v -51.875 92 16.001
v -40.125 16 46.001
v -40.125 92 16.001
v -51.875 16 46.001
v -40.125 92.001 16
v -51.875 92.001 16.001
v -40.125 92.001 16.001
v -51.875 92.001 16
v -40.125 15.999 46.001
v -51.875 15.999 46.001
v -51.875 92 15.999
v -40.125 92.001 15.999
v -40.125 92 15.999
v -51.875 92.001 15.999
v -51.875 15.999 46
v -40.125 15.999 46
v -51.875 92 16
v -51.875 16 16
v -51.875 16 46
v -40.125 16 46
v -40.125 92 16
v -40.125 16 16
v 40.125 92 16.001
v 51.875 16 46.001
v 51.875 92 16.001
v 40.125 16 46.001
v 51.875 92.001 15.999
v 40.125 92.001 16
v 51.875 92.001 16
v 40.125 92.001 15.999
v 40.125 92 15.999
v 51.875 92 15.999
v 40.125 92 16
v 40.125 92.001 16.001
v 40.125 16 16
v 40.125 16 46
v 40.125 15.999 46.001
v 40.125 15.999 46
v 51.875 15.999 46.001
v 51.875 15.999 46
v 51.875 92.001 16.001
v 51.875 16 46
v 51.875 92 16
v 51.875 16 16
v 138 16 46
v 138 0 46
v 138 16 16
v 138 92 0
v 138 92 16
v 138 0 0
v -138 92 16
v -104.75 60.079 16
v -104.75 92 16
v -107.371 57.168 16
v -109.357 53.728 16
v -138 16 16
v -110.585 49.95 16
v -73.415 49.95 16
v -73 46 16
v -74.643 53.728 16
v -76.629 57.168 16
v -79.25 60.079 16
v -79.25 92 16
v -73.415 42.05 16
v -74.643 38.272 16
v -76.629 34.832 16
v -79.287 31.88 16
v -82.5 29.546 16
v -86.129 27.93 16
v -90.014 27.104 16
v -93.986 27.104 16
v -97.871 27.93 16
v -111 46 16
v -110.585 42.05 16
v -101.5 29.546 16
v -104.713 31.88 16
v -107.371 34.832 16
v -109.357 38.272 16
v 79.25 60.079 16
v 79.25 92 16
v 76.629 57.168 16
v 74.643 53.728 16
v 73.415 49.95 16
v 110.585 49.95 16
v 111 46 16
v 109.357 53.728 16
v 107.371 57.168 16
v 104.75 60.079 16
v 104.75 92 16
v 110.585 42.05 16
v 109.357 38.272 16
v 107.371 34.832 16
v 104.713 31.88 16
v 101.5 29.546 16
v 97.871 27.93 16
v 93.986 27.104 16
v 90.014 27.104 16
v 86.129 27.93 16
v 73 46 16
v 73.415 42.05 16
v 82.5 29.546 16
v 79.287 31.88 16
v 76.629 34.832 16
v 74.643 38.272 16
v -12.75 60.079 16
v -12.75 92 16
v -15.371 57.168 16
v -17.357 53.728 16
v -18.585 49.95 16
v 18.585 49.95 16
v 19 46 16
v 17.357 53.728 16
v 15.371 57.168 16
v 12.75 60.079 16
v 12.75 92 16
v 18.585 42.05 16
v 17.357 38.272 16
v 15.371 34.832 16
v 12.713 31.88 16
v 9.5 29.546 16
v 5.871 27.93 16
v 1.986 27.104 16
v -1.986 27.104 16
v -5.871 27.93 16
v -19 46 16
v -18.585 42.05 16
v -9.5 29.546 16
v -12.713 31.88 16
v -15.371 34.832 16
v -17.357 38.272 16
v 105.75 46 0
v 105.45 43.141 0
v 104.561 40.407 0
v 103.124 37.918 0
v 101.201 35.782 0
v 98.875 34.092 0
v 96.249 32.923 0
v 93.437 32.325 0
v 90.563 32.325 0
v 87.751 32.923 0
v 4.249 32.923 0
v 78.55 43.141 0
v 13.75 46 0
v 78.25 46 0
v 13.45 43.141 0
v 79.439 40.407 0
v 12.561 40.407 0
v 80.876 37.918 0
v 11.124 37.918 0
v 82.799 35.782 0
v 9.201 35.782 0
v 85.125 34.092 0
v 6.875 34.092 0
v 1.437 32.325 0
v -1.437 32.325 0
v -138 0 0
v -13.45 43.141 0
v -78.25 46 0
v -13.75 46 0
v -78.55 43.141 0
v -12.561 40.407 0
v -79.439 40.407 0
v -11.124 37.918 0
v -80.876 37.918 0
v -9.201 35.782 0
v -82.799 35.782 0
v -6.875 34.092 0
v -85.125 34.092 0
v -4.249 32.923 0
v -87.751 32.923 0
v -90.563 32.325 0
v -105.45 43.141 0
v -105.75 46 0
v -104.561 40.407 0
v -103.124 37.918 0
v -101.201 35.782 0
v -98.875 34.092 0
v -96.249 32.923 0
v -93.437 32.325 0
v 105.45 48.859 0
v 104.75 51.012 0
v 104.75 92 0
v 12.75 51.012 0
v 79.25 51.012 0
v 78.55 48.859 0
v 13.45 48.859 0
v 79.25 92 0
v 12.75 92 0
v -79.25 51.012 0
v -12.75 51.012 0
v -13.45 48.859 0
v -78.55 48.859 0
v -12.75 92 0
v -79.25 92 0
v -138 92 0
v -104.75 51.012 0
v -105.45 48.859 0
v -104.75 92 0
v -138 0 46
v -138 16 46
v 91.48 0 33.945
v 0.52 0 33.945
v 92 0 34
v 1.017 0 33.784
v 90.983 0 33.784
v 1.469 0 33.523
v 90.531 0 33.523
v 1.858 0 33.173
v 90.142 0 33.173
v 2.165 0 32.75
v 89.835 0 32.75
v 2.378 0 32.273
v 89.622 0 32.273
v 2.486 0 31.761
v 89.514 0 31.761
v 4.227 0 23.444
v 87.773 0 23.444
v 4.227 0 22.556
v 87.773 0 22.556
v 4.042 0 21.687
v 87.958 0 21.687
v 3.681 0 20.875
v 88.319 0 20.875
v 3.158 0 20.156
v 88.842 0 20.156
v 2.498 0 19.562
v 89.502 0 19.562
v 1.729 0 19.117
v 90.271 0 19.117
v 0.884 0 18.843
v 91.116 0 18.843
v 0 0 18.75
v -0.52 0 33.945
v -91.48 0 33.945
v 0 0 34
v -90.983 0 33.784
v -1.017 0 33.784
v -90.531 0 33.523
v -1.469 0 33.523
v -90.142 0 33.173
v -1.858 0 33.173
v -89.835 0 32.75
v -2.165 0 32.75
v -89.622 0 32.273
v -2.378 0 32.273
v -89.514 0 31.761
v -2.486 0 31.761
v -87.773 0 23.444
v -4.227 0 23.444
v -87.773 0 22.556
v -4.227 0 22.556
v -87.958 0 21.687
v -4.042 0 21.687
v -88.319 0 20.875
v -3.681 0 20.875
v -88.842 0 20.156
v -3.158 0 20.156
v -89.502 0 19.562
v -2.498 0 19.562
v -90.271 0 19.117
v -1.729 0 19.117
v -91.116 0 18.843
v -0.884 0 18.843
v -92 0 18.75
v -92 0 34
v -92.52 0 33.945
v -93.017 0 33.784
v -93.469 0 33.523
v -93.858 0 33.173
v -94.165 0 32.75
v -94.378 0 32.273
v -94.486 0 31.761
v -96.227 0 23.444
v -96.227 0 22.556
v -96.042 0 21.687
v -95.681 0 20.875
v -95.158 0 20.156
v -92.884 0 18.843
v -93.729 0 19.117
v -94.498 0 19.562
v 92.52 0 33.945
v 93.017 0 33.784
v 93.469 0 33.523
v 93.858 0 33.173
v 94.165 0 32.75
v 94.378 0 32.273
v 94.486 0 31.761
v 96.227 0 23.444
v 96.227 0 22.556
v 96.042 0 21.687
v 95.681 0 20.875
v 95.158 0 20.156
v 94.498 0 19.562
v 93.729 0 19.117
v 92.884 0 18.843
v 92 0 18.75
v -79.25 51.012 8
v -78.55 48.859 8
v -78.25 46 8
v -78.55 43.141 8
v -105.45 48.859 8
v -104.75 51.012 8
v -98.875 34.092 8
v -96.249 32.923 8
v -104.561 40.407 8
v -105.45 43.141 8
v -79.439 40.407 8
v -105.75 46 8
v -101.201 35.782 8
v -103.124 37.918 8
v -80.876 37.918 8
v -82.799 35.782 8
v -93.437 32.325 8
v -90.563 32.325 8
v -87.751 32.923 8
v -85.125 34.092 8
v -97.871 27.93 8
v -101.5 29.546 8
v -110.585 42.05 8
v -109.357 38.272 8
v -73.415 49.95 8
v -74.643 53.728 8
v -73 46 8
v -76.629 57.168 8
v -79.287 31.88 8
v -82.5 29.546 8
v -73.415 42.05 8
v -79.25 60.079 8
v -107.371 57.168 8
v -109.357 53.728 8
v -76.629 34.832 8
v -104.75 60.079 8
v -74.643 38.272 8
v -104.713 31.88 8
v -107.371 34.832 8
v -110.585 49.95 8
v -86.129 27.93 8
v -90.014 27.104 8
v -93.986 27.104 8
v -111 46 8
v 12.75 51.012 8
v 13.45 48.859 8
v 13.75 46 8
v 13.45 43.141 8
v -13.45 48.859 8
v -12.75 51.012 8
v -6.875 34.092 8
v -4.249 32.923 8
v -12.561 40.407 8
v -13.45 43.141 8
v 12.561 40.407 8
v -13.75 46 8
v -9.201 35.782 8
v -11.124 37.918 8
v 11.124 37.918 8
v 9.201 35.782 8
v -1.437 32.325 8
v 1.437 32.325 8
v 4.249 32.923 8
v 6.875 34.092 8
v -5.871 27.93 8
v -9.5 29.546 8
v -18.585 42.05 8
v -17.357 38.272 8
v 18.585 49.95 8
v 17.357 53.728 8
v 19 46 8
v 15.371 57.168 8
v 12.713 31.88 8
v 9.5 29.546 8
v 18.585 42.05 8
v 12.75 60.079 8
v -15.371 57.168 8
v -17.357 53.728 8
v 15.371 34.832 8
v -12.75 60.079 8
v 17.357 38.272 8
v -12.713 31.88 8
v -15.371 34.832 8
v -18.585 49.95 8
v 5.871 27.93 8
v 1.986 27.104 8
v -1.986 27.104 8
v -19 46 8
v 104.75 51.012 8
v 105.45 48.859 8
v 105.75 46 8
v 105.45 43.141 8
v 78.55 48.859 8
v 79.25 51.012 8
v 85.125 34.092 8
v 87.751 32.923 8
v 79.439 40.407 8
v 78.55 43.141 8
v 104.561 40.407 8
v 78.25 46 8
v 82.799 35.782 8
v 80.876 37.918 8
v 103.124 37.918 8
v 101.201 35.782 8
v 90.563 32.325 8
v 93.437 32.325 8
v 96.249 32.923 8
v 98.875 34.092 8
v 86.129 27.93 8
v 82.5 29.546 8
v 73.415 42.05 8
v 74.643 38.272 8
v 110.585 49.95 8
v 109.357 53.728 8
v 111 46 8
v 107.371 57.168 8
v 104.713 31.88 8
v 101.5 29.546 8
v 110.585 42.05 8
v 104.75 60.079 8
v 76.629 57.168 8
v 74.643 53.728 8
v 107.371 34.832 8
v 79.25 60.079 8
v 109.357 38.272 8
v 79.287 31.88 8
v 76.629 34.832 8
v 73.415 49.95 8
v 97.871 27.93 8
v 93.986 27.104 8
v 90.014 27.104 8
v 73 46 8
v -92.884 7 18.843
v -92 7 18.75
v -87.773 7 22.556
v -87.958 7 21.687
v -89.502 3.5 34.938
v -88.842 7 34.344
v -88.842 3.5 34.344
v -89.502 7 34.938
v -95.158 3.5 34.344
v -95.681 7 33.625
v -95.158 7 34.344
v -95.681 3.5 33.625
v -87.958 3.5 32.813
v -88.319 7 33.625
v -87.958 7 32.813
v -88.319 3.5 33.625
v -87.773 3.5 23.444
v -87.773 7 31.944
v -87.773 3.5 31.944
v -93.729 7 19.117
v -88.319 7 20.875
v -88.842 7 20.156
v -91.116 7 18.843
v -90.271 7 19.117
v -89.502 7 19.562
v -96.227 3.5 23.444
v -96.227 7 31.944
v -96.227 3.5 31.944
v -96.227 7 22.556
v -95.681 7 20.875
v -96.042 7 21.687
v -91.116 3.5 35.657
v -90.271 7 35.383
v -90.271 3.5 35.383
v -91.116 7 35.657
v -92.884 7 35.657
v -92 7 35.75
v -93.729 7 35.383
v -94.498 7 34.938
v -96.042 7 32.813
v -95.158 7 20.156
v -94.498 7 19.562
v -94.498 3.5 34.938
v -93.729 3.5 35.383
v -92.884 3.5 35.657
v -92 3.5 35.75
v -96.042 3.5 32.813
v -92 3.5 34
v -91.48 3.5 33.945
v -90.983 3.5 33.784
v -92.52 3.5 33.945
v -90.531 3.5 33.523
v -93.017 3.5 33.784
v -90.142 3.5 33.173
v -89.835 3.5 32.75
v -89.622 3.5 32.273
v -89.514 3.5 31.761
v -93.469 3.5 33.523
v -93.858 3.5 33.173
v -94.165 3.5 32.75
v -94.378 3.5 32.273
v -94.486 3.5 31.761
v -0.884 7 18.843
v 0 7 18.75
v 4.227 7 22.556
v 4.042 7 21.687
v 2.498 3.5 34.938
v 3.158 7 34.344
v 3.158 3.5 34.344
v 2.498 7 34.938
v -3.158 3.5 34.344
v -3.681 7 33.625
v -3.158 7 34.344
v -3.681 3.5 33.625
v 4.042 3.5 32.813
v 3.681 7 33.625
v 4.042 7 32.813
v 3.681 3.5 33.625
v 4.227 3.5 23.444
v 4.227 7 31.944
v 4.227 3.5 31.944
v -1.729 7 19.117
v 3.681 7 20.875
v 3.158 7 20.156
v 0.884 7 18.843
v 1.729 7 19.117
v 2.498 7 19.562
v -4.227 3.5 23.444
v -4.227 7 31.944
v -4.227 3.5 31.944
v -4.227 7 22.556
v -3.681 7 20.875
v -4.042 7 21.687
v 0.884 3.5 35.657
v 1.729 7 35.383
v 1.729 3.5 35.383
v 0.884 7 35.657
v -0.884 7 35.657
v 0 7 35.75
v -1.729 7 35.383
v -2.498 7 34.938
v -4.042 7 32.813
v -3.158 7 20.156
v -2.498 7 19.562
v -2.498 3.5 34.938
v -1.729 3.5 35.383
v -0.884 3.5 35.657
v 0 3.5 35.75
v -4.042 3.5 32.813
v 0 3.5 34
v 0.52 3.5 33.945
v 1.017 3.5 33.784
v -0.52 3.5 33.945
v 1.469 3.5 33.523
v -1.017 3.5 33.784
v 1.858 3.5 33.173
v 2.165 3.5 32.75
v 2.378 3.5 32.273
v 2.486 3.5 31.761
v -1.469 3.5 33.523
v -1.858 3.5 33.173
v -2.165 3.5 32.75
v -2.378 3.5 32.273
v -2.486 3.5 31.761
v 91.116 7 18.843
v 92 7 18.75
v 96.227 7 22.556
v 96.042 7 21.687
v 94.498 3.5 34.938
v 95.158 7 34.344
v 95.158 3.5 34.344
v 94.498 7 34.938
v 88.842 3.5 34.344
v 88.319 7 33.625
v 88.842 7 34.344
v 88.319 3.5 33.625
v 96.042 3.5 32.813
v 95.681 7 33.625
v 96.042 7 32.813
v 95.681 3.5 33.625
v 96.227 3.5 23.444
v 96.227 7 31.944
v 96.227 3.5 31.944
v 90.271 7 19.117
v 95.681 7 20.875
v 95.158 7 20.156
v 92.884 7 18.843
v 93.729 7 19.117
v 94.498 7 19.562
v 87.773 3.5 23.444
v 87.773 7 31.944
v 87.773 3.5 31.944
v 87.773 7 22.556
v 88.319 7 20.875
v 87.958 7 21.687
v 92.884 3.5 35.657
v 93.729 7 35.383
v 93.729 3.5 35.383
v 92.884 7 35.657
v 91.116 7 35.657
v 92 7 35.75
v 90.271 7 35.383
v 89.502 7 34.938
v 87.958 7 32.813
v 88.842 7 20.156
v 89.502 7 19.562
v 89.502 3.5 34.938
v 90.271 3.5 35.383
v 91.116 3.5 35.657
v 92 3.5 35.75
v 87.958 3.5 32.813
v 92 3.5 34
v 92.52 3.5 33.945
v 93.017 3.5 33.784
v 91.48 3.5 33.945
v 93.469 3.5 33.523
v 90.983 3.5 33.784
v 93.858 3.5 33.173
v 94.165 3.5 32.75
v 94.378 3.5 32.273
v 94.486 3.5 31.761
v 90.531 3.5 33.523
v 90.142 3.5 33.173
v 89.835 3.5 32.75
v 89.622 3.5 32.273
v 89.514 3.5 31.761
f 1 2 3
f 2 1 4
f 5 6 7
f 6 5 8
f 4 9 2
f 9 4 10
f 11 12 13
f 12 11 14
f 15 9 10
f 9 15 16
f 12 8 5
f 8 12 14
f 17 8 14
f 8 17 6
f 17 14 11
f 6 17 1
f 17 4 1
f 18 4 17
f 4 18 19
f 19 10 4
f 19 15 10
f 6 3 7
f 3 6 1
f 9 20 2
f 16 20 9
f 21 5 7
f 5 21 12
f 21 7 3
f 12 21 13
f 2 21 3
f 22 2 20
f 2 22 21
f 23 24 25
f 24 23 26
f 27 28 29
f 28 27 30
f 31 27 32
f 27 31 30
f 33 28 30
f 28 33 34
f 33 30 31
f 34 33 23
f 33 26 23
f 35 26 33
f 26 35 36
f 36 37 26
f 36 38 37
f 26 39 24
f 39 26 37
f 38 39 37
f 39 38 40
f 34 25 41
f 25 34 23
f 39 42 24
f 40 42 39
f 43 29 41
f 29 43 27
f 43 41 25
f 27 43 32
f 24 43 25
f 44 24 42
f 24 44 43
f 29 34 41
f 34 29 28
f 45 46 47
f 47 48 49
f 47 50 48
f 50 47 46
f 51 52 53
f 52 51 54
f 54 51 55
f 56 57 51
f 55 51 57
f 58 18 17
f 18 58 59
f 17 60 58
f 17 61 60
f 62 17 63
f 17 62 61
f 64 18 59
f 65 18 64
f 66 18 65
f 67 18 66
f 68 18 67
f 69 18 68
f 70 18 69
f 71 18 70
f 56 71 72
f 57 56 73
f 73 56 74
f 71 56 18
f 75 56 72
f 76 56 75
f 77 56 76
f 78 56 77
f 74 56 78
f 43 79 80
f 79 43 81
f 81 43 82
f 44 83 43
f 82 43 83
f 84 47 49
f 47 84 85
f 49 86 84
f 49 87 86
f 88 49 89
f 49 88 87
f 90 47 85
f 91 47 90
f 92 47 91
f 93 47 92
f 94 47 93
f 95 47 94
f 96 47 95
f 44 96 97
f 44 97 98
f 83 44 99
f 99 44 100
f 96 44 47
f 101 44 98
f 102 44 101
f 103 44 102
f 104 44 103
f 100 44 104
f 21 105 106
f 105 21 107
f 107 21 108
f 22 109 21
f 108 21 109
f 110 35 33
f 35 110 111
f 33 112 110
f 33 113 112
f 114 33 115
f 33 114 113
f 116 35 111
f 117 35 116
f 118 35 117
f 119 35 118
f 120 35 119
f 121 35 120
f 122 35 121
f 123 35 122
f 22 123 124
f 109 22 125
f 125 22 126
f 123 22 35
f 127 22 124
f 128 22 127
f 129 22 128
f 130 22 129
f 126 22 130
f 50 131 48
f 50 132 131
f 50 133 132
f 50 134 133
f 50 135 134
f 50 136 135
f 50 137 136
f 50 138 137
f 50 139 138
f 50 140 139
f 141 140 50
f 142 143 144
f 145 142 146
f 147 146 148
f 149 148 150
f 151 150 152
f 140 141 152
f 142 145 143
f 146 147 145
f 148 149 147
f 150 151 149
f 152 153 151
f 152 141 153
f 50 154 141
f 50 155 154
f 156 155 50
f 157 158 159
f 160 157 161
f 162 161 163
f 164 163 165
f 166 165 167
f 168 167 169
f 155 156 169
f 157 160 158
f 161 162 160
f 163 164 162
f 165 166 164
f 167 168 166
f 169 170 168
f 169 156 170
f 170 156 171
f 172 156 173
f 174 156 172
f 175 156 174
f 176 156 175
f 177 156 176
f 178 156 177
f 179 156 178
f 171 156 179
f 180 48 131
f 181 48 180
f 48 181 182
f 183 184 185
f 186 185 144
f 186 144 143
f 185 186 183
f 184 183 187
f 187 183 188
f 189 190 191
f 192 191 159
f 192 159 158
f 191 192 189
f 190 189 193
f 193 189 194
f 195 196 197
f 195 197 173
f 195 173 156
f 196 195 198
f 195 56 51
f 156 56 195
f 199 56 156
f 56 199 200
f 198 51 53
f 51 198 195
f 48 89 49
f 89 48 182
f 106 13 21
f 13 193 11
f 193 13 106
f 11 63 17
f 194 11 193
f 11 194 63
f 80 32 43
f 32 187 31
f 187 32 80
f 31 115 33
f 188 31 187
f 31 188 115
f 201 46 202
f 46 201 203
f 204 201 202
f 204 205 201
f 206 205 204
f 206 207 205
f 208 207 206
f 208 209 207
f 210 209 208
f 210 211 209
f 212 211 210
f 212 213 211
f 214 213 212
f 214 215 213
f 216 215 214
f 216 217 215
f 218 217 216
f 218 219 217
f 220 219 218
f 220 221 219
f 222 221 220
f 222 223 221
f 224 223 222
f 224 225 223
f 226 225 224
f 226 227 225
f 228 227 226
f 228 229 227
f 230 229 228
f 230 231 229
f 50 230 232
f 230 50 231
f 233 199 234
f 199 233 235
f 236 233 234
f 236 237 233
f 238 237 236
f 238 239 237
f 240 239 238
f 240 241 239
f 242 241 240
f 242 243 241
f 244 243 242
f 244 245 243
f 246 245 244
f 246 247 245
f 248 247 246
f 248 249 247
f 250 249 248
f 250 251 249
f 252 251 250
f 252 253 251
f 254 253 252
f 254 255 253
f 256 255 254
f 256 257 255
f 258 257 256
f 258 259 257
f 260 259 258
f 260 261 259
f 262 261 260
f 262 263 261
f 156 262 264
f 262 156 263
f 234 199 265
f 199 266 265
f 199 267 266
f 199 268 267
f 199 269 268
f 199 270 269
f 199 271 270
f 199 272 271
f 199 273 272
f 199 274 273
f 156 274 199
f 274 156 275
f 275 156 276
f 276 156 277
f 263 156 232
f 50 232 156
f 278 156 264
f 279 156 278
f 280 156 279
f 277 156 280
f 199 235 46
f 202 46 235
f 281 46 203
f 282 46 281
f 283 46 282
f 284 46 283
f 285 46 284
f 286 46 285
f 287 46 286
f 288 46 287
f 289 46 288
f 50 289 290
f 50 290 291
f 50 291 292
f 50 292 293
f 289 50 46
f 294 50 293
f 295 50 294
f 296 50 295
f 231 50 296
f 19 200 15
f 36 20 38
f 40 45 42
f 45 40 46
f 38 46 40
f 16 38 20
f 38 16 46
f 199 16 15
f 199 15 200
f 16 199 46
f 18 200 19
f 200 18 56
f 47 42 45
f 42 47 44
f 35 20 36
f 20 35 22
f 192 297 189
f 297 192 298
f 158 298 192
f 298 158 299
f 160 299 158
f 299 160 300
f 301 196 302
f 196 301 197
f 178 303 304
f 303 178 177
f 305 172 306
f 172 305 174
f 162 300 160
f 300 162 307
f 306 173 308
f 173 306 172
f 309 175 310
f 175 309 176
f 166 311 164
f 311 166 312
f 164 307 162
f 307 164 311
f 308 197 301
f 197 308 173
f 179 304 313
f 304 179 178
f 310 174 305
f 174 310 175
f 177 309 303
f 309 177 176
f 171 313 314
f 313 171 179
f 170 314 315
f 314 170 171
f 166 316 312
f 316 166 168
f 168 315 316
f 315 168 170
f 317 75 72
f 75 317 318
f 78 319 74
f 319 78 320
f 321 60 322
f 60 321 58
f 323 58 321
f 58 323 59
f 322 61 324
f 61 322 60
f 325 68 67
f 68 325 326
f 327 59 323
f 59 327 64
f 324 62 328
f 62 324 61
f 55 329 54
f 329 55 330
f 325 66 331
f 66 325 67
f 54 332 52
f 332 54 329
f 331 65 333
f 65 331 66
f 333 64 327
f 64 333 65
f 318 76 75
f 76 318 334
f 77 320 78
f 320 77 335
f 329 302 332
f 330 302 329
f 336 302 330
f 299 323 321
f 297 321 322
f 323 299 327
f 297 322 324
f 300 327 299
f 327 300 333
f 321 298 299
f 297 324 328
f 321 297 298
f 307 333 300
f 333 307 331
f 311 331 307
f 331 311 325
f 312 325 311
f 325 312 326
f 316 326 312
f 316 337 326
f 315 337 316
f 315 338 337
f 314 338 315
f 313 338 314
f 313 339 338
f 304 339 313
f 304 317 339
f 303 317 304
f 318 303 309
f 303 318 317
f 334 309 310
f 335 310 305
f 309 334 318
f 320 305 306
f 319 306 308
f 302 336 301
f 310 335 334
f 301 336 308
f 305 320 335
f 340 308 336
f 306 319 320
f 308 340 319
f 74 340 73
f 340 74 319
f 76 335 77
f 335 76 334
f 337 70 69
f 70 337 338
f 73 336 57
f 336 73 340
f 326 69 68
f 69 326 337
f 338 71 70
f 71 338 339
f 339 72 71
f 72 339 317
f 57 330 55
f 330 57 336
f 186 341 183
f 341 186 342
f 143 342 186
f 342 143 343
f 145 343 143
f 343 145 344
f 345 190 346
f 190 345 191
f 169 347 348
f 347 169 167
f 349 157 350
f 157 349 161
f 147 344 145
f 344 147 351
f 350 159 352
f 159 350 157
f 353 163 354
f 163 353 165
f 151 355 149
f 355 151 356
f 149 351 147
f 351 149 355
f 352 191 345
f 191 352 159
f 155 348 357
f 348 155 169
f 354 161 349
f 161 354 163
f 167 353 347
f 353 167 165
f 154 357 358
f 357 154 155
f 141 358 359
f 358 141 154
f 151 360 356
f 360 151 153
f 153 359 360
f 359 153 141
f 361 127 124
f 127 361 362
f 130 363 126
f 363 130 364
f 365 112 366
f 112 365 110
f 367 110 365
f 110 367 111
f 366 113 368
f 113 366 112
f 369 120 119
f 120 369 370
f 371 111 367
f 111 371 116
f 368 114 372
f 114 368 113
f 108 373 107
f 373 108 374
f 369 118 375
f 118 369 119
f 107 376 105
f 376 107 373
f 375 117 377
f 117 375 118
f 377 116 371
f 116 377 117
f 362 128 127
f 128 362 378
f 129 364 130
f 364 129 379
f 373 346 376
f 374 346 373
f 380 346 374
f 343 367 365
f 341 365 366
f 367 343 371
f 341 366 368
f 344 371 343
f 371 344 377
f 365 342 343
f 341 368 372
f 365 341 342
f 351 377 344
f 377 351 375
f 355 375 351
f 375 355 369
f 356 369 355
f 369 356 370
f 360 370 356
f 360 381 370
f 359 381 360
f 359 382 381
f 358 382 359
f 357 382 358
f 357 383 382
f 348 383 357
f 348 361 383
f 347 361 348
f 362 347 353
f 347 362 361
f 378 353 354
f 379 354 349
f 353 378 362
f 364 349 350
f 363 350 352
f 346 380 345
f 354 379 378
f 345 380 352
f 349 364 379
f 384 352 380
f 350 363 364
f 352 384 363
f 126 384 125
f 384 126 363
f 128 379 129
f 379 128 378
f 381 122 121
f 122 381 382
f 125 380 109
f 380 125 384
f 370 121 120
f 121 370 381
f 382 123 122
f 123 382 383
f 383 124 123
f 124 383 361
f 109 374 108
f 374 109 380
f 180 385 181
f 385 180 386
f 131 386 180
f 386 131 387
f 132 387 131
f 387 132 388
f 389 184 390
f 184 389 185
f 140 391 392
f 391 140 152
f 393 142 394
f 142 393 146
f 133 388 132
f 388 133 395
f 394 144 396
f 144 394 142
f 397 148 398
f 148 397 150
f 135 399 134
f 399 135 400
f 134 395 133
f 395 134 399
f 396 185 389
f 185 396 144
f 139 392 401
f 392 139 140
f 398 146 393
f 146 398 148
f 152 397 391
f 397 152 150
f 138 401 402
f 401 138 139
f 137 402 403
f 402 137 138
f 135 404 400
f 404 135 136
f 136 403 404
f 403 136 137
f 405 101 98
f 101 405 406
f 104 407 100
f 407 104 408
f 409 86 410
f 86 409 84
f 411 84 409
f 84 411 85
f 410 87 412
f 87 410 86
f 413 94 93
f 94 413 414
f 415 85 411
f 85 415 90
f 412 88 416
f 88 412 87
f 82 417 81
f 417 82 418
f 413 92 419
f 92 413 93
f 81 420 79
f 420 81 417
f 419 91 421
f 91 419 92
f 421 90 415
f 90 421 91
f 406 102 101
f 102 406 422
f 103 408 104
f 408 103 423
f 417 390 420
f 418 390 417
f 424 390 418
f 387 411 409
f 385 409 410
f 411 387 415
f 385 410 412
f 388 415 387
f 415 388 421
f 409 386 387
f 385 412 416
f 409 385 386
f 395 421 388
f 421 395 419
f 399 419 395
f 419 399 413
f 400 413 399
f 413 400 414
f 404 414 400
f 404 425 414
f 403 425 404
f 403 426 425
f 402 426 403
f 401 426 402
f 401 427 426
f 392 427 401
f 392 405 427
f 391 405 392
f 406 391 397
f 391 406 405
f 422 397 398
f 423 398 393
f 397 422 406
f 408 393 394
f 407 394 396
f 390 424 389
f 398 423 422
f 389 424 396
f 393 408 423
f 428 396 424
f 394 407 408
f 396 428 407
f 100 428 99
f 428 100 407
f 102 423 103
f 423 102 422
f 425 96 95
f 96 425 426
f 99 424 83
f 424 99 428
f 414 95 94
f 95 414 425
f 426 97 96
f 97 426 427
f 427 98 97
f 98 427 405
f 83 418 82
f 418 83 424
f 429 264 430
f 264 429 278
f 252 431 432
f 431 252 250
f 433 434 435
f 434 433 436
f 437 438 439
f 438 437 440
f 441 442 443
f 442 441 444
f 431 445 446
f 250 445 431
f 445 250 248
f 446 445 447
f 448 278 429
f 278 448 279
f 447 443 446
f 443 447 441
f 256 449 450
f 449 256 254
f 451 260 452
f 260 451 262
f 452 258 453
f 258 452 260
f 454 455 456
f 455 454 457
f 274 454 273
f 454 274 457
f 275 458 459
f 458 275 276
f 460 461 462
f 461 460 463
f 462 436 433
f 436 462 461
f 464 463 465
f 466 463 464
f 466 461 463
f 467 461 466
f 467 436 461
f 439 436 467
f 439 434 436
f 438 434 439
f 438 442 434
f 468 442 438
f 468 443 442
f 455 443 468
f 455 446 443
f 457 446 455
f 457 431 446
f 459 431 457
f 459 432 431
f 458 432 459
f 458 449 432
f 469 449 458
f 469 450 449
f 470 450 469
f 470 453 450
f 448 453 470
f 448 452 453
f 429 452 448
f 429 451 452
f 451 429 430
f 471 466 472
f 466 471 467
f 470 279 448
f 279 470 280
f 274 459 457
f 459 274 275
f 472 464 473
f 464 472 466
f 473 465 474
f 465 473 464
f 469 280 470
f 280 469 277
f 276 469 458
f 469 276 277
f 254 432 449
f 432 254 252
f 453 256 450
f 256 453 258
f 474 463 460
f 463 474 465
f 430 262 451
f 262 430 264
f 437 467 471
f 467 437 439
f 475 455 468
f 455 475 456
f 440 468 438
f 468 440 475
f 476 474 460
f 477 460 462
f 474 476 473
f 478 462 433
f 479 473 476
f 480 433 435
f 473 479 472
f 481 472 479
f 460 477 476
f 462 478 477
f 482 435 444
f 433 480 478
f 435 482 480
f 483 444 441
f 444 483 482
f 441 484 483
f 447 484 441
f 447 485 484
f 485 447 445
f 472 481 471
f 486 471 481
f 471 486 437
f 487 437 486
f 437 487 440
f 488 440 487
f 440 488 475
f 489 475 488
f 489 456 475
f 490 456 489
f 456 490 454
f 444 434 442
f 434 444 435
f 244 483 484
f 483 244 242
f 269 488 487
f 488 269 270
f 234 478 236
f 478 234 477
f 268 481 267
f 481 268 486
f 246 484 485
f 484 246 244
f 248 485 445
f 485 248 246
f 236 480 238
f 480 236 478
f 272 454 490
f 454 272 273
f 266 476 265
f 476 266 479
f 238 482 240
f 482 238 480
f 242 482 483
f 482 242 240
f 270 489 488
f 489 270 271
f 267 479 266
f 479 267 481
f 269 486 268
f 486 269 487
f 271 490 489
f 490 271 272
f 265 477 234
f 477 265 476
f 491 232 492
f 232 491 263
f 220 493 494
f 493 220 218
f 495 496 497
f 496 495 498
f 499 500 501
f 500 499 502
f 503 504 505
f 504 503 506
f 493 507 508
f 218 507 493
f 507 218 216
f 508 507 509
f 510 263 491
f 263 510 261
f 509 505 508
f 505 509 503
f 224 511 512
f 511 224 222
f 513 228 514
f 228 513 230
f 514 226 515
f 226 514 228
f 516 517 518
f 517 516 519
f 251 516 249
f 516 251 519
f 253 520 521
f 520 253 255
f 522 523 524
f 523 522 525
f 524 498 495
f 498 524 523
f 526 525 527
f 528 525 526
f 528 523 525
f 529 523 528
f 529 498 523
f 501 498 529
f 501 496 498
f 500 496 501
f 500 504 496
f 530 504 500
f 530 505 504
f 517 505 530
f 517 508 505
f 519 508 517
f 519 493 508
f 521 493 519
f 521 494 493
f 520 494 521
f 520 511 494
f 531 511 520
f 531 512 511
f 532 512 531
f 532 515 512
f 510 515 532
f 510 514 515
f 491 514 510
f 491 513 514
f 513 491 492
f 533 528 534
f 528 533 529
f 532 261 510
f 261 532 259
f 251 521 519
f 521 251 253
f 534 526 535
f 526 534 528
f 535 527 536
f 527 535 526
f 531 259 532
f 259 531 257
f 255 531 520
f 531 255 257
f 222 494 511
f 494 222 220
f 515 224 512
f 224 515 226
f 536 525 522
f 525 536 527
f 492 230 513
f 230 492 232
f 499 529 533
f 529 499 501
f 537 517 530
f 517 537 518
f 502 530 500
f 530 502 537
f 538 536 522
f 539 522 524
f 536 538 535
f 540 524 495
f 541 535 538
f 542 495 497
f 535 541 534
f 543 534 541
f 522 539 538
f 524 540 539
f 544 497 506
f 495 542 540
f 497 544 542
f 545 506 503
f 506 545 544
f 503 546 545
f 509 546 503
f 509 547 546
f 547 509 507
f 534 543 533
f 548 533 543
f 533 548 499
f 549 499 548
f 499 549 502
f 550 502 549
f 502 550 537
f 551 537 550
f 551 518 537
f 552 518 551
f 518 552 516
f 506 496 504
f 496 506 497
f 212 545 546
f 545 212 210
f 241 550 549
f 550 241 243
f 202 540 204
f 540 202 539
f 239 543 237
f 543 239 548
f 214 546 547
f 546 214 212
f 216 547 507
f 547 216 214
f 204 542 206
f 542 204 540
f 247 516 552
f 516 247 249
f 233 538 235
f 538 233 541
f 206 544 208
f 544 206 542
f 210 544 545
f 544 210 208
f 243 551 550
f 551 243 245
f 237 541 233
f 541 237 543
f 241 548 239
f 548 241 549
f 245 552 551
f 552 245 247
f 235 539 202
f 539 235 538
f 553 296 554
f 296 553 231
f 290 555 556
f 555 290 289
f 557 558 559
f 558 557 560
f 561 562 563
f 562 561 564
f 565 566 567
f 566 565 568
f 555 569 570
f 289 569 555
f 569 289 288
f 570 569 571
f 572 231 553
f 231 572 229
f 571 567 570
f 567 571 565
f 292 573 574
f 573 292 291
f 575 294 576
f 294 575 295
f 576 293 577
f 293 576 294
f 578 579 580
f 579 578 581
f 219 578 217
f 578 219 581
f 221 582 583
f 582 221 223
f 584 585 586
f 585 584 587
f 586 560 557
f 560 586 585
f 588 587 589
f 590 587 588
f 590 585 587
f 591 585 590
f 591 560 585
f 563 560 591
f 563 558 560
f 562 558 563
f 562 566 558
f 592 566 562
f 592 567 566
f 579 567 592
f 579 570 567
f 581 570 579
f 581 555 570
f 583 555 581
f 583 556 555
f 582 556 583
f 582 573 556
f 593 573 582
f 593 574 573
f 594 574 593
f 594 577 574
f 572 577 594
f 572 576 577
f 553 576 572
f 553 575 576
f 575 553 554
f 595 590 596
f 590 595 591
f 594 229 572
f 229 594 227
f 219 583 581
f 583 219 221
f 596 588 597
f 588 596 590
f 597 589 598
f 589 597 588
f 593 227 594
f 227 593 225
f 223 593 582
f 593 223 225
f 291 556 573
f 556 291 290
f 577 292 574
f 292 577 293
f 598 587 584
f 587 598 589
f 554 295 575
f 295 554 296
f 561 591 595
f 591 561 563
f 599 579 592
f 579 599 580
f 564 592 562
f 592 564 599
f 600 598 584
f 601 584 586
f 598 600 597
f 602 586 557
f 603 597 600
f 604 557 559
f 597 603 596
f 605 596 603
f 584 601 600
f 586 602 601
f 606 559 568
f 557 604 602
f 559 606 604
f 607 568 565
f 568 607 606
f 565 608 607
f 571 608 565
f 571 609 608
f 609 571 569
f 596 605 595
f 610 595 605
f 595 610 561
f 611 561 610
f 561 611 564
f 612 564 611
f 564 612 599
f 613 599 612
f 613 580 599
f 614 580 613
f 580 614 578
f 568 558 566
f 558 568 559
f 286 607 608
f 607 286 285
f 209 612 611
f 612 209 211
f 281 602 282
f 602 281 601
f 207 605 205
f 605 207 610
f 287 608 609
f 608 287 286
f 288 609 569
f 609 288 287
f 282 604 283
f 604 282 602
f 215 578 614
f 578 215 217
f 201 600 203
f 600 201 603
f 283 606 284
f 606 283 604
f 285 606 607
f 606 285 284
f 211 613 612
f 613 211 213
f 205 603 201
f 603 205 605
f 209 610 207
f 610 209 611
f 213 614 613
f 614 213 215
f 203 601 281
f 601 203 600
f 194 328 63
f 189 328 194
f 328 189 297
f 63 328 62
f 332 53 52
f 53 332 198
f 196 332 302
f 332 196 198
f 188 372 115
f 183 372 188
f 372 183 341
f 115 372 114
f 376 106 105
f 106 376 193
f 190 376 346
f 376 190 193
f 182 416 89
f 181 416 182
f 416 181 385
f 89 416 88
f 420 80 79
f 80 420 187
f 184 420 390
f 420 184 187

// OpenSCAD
//How many slots wide do you want
clubs_wide = 3; //[1:1:9]
//How many clubs fit in one slots
clubs_thick = 1; //[1:1:2]
//What is the diameter of the bulb on your club
bulb_diameter = 92; //[60:.5:100]
//How thick is the handle near the knob
handle_diameter = 23.5; //[5:.5:40]
//How thick the knob on your clubs are
knob_diameter = 34; //[20:.5:40]
//How thick do you want the bracket to be (16mm recomended)
bracket_thickness = 16; //[10:.5:40]
$fn = 30;

//Mounting (add some a couple millimeters to ensure an easy fit)
screw_head_diameter = 8.5; //[1:.5:10]
screw_head_Thickness = 3.5; //[1:.25:10]
screw_diameter = 5; //[1:.25:10]

module bracket(){
  translate([-(bulb_diameter*clubs_wide)/2,0,0])
    difference(){
      union(){
        cube([bulb_diameter*clubs_wide,bulb_diameter*clubs_thick,bracket_thickness]);
        translate([0,0,bracket_thickness])
          cube([bulb_diameter*clubs_wide,bracket_thickness,(bulb_diameter/2)-bracket_thickness]);
        for(h = [0:bulb_diameter:bulb_diameter*(clubs_wide-2)])
          translate([bulb_diameter+h,bracket_thickness,bracket_thickness])
            support();
      }
      //cuts out the holes that the clubs fit in
      union(){
        for(i = [0:bulb_diameter:bulb_diameter*(clubs_thick-1)])
          for(j = [0:bulb_diameter:bulb_diameter*(clubs_wide-1)])
            translate([bulb_diameter/2+j,bulb_diameter/2+i,0])
              union(){
                cylinder(r = handle_diameter/2+2, h = bracket_thickness+.1);
                translate([0,0,bracket_thickness/2])
                  cylinder(r = knob_diameter/2+2, h = bracket_thickness/2+.1);
              }
        //cuts the slots so the clubs can slide in
        for(k = [0:bulb_diameter:bulb_diameter*(clubs_wide-1)]){
          translate([bulb_diameter/2+k,bulb_diameter/2+(bulb_diameter*clubs_thick)/2,bracket_thickness/2])
            cube([handle_diameter+2,bulb_diameter*clubs_thick,bracket_thickness+.1],center = true);
        translate([k,0,0])
          mountingHoles();
        }
      }
    }
}
//generates triangle supports
module support(){
  cylinderRadius = .001;
  rotate([0,90,0]) hull(){
    cylinder(r = cylinderRadius, h = handle_diameter/2, center = true);
    translate([-(bulb_diameter/2-bracket_thickness),0,0])
      cylinder(r = cylinderRadius, h = handle_diameter/2, center = true);
    translate([0,(bulb_diameter*clubs_thick)-bracket_thickness,0])
      cylinder(r = cylinderRadius, h = handle_diameter/2, center = true);
  }
}
module mountingHoles(){
  translate([bulb_diameter/2,screw_head_Thickness*2,bulb_diameter/4]) rotate([0,-90,90]){
    hull(){
      cylinder(r = screw_head_diameter/2, h = screw_head_Thickness);
      translate([screw_head_diameter,0,0])
        cylinder(r = screw_head_diameter/2, h = screw_head_Thickness);
    }
    translate([0,0,screw_head_Thickness]) hull(){
      cylinder(r = screw_head_diameter/2, h = screw_head_Thickness+1);
      translate([screw_head_diameter,0,0])
        cylinder(r = screw_diameter/2, h = screw_head_Thickness+1);
    }
  }

}

  bracket();
